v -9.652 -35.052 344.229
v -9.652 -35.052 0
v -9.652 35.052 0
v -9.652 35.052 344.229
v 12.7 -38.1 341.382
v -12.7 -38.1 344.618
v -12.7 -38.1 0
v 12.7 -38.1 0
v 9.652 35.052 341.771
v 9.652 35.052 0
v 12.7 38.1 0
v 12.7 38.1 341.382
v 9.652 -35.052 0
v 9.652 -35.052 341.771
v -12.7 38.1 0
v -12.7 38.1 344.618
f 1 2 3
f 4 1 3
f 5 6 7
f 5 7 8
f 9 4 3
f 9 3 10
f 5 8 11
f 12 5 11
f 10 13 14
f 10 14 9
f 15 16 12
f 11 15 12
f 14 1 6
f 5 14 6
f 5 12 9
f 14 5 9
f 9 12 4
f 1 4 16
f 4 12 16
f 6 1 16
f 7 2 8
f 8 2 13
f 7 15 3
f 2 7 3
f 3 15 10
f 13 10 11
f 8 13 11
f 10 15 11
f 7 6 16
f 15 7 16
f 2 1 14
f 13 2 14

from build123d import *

# Parameters (mm, degrees)
SKETCH2_W               = 9.652
SKETCH2_H               = 3.048
SKETCH2_W_2             = 3.048
SKETCH2_H_2             = 35.052
BOSS_EXTRUDE1_DEPTH     = 343
SKETCH3_W               = 25.4
SKETCH3_H               = 76.2
SKETCH3_W_2             = 19.304
SKETCH3_H_2             = 70.104
BOSS_EXTRUDE2_DEPTH     = 50
CUT_EXTRUDE2_DEPTH      = 1
CUT_EXTRUDE2_DEPTH_BACK = 77.2


with BuildPart() as part:
    # Sketch2 → Boss-Extrude1 (new body)
    with BuildSketch(Plane.XY):
        Polygon((-12.7, 0), (-9.652, 0), (-9.652, 35.052), (-9.652, 38.1), (-12.7, 38.1), align=None)
        with Locations((-4.826, 36.576)):
            Rectangle(SKETCH2_W, SKETCH2_H)
        Polygon((0, 38.1), (0, 35.052), (9.652, 35.052), (9.652, 0), (12.7, 0), (12.7, 38.1), align=None)
        with Locations((11.176, -17.526)):
            Rectangle(SKETCH2_W_2, SKETCH2_H_2)
        Polygon((-9.652, -35.052), (-9.652, 0), (-12.7, 0), (-12.7, -38.1), (0, -38.1), (0, -35.052), align=None)
        Polygon((9.652, -35.052), (0, -35.052), (0, -38.1), (12.7, -38.1), (12.7, -35.052), align=None)
    extrude(amount=BOSS_EXTRUDE1_DEPTH)

    # Sketch3 → Boss-Extrude2 (add)
    with BuildSketch(Plane.XY.offset(343)):
        Rectangle(SKETCH3_W, SKETCH3_H)
        Rectangle(SKETCH3_W_2, SKETCH3_H_2, mode=Mode.SUBTRACT)
    extrude(amount=BOSS_EXTRUDE2_DEPTH)

    # Sketch5 → Cut-Extrude2 (cut, two sides)
    with BuildSketch(Plane(origin=(0, 38.1, 0), x_dir=(1, 0, 0), z_dir=(0, 1, 0))) as cut_extrude2_sk:
        Polygon((12.7, -391.250668344), (12.534006261, -391.403498707), (0, -343), (-12.7, -344.617644511), (-12.7, -393), (12.7, -393), align=None)
        Polygon((12.7, -341.382355489), (12.7, -391.250668344), (75.559800862, -333.375677395), align=None)
        Polygon((0, -343), (12.534006261, -391.403498707), (12.7, -391.250668344), (12.7, -341.382355489), align=None)
    extrude(amount=CUT_EXTRUDE2_DEPTH, mode=Mode.SUBTRACT)
    extrude(cut_extrude2_sk.sketch, amount=-CUT_EXTRUDE2_DEPTH_BACK, mode=Mode.SUBTRACT)


solid = part.part
